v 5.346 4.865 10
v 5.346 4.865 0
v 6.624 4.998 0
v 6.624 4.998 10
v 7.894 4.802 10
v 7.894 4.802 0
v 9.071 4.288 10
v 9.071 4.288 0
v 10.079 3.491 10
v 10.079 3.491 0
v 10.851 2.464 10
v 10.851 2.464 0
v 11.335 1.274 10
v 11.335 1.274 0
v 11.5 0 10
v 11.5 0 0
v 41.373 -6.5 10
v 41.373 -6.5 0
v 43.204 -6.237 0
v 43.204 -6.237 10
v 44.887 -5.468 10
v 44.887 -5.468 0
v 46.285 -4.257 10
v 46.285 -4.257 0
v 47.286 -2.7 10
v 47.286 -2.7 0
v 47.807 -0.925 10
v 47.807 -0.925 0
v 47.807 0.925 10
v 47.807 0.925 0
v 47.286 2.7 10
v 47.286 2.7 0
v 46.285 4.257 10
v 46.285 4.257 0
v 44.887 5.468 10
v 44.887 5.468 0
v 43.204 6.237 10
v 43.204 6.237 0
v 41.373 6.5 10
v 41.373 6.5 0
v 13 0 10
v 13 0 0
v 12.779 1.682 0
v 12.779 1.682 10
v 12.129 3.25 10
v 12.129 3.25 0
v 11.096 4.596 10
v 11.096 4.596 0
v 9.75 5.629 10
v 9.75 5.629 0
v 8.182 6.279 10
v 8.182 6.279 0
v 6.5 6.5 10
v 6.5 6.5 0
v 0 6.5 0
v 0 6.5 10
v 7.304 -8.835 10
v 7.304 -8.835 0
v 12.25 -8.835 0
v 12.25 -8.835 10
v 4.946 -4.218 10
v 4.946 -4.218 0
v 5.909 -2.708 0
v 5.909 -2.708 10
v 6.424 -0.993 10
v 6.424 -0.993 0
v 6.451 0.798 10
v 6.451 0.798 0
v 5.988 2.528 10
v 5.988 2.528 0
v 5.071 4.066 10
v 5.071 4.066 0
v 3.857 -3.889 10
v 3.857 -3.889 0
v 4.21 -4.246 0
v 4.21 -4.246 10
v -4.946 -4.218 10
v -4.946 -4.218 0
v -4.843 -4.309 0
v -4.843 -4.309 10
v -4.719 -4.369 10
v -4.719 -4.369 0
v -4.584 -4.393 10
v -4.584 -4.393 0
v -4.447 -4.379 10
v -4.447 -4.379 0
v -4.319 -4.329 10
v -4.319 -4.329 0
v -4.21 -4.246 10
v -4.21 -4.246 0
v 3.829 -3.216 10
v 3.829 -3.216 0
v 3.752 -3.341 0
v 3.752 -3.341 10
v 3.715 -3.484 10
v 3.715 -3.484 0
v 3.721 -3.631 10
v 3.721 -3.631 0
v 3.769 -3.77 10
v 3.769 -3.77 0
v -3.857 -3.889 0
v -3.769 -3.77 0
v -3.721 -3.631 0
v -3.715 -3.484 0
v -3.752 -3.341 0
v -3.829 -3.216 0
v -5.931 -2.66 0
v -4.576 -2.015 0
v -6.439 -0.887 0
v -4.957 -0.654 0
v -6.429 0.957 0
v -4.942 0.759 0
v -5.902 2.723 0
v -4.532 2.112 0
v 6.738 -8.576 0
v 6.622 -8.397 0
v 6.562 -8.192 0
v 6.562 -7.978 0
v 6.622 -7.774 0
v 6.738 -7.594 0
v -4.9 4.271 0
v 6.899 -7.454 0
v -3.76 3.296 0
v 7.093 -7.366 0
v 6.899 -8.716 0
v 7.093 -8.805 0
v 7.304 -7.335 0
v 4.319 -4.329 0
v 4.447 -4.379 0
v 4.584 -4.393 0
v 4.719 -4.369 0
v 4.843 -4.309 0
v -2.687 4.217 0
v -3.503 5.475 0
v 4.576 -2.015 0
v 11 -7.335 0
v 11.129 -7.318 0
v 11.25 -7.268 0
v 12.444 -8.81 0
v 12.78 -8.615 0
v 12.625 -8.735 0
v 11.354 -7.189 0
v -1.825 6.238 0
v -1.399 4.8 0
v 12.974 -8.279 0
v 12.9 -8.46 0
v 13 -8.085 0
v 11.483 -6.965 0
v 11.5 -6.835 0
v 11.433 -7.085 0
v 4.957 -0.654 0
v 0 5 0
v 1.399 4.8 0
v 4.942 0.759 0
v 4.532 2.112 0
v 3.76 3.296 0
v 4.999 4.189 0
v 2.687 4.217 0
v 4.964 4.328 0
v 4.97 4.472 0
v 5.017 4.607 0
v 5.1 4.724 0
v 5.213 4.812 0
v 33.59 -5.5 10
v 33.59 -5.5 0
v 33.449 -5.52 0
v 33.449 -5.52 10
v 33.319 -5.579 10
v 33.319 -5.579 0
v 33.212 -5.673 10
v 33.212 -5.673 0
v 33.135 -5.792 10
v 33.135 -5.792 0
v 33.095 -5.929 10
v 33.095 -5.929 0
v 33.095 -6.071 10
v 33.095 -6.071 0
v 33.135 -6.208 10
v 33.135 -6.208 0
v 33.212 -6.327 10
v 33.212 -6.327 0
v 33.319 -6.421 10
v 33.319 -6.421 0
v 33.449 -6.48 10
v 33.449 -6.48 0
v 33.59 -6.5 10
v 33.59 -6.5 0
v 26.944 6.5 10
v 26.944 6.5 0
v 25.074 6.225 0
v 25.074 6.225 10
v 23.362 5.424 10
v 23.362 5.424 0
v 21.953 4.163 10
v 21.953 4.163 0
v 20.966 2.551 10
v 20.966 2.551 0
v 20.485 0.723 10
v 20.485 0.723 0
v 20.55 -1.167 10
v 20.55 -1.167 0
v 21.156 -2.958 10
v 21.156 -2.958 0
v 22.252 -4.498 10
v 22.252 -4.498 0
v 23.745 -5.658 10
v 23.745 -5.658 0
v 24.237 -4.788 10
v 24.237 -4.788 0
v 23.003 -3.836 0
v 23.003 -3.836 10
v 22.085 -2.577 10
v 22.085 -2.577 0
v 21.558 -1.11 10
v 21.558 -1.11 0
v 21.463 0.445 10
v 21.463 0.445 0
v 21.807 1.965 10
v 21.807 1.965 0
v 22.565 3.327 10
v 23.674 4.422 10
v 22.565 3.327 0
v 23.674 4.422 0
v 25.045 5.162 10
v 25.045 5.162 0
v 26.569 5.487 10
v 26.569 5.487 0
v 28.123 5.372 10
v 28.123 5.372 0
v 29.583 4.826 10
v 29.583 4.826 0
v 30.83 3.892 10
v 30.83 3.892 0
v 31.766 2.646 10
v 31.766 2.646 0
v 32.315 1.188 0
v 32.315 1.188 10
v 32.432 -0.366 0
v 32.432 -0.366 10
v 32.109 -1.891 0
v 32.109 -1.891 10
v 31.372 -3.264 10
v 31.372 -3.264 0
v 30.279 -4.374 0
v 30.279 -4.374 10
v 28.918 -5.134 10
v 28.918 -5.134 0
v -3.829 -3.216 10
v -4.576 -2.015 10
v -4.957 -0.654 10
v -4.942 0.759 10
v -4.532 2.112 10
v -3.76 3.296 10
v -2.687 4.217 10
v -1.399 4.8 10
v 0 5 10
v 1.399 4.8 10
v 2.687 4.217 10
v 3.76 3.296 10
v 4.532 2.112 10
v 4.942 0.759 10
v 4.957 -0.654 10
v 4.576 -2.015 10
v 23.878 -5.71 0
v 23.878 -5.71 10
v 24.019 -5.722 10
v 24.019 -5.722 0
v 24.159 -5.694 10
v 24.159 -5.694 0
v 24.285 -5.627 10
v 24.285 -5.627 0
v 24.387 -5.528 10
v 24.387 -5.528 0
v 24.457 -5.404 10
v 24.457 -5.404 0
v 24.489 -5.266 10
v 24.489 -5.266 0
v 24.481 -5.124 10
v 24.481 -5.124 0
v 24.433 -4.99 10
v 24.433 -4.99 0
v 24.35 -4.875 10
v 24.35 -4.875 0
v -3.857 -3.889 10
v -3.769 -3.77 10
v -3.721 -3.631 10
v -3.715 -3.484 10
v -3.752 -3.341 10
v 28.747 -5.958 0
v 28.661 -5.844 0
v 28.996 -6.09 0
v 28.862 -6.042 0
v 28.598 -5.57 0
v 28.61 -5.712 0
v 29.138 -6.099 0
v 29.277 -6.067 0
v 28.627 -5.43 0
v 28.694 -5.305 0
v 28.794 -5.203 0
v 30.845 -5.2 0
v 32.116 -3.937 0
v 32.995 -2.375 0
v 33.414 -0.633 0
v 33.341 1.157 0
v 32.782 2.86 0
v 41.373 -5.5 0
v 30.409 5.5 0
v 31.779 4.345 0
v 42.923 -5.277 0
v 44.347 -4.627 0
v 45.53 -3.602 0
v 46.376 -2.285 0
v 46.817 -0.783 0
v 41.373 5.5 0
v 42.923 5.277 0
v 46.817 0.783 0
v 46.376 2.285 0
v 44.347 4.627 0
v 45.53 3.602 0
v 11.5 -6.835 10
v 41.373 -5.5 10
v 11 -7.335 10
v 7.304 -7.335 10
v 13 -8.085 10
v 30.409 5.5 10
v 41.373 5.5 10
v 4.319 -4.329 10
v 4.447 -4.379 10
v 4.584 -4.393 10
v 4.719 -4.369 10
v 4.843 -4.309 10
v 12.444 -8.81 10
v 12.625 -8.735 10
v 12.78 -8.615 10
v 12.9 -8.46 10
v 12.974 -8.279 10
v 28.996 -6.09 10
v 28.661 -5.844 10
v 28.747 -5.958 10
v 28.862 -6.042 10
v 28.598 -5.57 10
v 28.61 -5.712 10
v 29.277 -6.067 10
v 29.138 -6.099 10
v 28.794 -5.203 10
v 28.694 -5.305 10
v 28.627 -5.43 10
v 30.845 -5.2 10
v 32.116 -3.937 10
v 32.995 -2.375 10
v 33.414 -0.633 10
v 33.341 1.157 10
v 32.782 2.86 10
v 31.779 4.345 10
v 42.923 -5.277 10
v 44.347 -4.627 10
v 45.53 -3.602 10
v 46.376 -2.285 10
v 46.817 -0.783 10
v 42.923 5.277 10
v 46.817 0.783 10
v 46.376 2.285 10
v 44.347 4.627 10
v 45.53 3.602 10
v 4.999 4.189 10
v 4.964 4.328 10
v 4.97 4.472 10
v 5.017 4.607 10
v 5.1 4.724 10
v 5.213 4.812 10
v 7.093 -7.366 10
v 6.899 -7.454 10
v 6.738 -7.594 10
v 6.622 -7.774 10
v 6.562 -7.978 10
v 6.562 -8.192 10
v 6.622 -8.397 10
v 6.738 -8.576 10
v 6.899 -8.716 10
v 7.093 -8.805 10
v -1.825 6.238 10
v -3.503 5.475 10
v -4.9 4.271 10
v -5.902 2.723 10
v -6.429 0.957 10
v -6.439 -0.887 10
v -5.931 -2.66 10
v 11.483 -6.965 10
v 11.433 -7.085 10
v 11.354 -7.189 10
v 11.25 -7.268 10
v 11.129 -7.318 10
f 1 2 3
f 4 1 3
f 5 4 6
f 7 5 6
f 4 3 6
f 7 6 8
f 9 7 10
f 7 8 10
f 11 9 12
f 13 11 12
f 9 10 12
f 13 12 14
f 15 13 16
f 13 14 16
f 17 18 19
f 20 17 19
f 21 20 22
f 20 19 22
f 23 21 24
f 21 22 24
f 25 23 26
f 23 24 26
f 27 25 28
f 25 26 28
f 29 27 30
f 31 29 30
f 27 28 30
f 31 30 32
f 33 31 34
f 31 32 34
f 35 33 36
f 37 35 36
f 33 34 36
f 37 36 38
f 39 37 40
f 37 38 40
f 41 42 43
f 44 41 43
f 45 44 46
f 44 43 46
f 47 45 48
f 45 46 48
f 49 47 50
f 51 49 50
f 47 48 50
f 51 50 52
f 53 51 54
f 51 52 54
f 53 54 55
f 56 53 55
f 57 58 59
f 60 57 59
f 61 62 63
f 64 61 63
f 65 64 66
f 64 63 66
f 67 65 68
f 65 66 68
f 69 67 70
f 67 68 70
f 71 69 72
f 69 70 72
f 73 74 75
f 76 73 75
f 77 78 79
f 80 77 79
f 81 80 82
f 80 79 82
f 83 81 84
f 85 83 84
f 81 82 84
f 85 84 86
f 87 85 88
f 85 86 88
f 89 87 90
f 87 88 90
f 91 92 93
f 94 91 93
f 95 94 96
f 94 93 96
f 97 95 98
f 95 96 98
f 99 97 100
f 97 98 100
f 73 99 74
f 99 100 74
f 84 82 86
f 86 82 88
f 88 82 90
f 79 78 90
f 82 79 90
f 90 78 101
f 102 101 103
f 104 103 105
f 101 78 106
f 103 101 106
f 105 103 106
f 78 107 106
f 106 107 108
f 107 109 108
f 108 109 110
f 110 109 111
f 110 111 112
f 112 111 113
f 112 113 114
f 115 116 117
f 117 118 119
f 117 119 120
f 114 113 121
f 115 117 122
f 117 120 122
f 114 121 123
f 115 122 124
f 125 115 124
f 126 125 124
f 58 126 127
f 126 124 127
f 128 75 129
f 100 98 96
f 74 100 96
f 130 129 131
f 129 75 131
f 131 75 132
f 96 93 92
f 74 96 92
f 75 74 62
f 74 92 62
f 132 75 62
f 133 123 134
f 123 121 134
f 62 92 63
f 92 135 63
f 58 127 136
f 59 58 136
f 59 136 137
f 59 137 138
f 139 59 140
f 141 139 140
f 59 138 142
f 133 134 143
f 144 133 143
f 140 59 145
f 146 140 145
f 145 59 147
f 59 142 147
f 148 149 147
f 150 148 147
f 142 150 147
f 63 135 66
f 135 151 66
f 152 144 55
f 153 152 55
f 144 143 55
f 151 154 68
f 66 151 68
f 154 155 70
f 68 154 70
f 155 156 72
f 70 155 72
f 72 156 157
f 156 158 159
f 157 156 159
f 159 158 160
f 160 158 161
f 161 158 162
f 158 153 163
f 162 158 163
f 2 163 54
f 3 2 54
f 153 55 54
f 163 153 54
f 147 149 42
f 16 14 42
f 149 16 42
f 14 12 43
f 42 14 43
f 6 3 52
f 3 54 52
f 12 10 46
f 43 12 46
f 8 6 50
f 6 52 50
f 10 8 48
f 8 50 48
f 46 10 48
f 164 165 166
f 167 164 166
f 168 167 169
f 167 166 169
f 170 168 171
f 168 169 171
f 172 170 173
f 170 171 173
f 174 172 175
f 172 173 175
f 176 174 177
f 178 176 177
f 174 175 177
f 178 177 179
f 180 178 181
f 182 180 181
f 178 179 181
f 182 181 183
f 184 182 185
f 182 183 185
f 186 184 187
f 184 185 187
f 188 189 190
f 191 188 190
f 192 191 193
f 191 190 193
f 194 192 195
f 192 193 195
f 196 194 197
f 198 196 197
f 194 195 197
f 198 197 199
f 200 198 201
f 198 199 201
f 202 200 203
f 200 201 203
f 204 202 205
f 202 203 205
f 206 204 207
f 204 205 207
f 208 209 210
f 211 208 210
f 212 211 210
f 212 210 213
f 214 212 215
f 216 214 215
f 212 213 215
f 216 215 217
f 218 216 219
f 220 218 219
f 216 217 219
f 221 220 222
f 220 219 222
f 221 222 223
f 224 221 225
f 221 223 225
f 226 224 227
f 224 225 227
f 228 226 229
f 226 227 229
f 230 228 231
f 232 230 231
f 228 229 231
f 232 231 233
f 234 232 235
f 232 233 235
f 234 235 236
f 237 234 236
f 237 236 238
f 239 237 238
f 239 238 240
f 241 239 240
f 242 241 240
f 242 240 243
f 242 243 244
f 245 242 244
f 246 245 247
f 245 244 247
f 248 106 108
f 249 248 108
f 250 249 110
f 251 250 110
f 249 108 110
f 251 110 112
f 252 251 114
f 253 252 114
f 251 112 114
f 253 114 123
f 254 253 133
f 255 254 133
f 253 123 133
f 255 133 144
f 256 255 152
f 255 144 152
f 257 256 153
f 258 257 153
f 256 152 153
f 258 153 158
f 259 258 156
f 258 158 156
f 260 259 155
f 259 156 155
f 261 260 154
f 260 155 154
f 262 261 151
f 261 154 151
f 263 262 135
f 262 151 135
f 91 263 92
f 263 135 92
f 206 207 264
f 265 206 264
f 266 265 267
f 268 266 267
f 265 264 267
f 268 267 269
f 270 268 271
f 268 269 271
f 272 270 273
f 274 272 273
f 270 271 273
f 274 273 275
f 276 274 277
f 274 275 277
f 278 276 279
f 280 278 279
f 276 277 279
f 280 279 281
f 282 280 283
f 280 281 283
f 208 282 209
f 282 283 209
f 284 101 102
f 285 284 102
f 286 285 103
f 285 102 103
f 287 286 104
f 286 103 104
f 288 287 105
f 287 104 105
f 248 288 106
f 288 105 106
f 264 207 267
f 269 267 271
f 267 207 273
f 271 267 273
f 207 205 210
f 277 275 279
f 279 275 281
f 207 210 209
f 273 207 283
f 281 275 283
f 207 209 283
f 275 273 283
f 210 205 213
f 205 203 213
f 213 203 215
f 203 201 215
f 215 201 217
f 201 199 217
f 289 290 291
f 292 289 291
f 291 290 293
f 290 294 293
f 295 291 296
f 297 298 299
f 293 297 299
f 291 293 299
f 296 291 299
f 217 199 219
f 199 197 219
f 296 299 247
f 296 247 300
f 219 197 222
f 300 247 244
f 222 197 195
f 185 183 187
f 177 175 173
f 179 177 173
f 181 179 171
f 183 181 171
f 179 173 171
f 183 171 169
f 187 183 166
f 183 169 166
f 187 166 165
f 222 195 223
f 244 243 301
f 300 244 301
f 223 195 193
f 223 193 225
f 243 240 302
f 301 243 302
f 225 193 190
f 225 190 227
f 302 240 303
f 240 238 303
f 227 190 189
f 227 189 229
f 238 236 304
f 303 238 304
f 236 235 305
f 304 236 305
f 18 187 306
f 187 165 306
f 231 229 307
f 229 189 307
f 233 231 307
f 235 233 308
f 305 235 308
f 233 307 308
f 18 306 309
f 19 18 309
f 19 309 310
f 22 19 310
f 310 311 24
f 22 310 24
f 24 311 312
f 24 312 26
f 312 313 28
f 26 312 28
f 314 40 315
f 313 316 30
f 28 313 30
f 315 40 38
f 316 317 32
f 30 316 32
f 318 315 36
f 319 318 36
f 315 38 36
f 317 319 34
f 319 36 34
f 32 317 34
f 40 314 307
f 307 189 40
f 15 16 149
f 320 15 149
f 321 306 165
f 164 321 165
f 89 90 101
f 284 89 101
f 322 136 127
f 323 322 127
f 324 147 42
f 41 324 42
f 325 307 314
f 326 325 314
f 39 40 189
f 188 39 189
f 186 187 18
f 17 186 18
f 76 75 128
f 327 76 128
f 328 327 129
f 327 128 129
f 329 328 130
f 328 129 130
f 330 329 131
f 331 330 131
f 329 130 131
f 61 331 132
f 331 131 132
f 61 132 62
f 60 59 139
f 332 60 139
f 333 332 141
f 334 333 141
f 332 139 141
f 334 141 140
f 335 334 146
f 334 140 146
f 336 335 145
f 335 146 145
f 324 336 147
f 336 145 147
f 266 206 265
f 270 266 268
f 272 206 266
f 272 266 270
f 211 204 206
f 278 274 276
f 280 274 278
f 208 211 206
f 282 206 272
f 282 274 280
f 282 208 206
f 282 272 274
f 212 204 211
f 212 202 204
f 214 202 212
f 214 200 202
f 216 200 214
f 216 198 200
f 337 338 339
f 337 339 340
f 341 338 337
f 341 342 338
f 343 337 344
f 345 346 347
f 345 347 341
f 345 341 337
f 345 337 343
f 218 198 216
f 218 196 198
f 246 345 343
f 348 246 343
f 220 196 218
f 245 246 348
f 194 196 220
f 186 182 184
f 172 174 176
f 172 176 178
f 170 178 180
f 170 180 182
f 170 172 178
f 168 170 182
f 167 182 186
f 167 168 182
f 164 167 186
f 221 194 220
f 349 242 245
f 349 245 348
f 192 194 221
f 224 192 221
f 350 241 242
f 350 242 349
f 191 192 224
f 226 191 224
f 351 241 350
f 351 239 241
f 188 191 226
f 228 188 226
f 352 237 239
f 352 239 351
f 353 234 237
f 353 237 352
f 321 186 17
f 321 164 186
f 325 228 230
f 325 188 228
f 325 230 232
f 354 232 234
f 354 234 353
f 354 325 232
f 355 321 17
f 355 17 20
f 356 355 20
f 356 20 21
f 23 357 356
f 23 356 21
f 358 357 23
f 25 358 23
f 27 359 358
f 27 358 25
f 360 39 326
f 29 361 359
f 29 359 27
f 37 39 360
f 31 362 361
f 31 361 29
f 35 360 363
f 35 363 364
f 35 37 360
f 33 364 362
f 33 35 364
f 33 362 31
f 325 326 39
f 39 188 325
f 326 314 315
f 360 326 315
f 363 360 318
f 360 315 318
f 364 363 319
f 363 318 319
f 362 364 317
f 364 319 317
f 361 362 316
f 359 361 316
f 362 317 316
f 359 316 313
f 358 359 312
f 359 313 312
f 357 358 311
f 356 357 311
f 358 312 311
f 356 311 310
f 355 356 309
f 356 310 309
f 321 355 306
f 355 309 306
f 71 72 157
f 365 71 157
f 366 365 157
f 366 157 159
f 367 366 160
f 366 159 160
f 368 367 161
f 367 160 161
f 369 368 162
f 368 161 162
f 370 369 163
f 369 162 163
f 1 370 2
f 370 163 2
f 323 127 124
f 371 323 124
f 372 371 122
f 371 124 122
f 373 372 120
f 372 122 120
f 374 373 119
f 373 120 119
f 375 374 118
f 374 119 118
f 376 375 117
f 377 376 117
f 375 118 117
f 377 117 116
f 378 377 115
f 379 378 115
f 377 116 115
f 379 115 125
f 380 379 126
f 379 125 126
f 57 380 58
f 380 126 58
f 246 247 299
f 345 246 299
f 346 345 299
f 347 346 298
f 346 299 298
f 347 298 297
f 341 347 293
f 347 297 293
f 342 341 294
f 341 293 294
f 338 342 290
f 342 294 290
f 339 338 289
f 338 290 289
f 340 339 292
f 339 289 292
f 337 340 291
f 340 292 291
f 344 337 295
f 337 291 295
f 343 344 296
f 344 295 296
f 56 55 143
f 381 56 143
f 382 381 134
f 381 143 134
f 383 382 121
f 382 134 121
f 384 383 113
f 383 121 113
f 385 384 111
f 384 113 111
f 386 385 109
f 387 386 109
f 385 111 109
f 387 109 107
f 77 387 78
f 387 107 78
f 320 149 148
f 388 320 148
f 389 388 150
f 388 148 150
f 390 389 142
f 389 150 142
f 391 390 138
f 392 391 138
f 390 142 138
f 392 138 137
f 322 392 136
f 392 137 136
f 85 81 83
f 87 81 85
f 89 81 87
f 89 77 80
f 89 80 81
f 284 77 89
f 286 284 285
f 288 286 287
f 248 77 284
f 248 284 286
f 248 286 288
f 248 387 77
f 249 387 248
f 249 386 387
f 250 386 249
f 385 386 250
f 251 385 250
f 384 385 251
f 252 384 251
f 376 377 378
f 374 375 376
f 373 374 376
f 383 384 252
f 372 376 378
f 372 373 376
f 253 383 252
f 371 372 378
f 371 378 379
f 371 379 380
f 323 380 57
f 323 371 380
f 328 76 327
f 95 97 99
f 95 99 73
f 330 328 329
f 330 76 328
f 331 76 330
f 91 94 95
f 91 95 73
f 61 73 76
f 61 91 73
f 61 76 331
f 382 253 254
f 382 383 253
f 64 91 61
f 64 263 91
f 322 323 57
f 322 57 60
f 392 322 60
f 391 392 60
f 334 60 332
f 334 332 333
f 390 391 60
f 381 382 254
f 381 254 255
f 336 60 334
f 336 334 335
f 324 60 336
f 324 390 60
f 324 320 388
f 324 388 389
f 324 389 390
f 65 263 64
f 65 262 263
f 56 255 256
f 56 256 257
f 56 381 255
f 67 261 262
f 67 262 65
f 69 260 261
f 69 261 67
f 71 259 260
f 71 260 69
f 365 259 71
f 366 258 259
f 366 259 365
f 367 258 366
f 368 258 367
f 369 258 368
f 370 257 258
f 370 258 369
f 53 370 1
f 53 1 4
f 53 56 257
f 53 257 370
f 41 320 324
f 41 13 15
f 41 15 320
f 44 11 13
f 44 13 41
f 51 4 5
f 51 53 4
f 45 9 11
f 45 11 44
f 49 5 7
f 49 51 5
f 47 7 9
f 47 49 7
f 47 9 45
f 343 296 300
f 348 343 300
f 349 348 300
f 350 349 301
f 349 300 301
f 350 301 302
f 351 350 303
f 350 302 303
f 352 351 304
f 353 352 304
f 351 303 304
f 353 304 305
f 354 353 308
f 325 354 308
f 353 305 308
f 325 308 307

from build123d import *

# Parameters (mm, degrees)
F1_DEPTH = 10


with BuildPart() as f1:
    # F0 (on Top) → F1 (new body)
    with BuildSketch(Plane.XY):
        with BuildLine():
            ThreePointArc((-3.828886, -3.21553), (0, 5), (3.828886, -3.21553))
            ThreePointArc((3.828886, -3.21553), (3.712201, -3.557744), (3.856745, -3.889154))
            Line((3.856745, -3.889154), (4.210157, -4.245536))
            ThreePointArc((4.210157, -4.245536), (4.583948, -4.393113), (4.945619, -4.217921))
            ThreePointArc((4.945619, -4.217921), (6.49925, -0.098708), (5.071429, 4.065786))
            ThreePointArc((5.071429, 4.065786), (4.988692, 4.541068), (5.346154, 4.865043))
            ThreePointArc((5.346154, 4.865043), (9.600868, 3.922323), (11.5, 0))
            Line((11.5, 0), (11.5, -6.835121))
            ThreePointArc((11.5, -6.835121), (11.353553, -7.188674), (11, -7.335121))
            Line((11, -7.335121), (7.304424, -7.335121))
            ThreePointArc((7.304424, -7.335121), (6.554424, -8.085121), (7.304424, -8.835121))
            Line((7.304424, -8.835121), (12.25, -8.835121))
            ThreePointArc((12.25, -8.835121), (12.78033, -8.615451), (13, -8.085121))
            Line((13, -8.085121), (13, 0))
            ThreePointArc((13, 0), (11.096194, 4.596194), (6.5, 6.5))
            Line((6.5, 6.5), (0, 6.5))
            ThreePointArc((0, 6.5), (-5.901969, 2.723372), (-4.945619, -4.217921))
            ThreePointArc((-4.945619, -4.217921), (-4.583948, -4.393113), (-4.210157, -4.245536))
            Line((-4.210157, -4.245536), (-3.856745, -3.889154))
            ThreePointArc((-3.856745, -3.889154), (-3.712201, -3.557744), (-3.828886, -3.21553))
        make_face()
        with BuildLine():
            ThreePointArc((24.237214, -4.787552), (27.35023, 5.485014), (28.917861, -5.133791))
            ThreePointArc((28.917861, -5.133791), (28.63055, -5.779896), (29.276655, -6.067207))
            ThreePointArc((29.276655, -6.067207), (33.41359, -0.633049), (30.408592, 5.5))
            Line((30.408592, 5.5), (41.373112, 5.5))
            ThreePointArc((41.373112, 5.5), (46.873112, 0), (41.373112, -5.5))
            Line((41.373112, -5.5), (33.589512, -5.5))
            ThreePointArc((33.589512, -5.5), (33.089512, -6), (33.589512, -6.5))
            Line((33.589512, -6.5), (41.373112, -6.5))
            ThreePointArc((41.373112, -6.5), (47.873112, 0), (41.373112, 6.5))
            Line((41.373112, 6.5), (26.94449, 6.5))
            ThreePointArc((26.94449, 6.5), (20.65851, 1.654221), (23.744981, -5.658016))
            ThreePointArc((23.744981, -5.658016), (24.42633, -5.4689), (24.237214, -4.787552))
        make_face()
    extrude(amount=F1_DEPTH)


solid = f1.part
